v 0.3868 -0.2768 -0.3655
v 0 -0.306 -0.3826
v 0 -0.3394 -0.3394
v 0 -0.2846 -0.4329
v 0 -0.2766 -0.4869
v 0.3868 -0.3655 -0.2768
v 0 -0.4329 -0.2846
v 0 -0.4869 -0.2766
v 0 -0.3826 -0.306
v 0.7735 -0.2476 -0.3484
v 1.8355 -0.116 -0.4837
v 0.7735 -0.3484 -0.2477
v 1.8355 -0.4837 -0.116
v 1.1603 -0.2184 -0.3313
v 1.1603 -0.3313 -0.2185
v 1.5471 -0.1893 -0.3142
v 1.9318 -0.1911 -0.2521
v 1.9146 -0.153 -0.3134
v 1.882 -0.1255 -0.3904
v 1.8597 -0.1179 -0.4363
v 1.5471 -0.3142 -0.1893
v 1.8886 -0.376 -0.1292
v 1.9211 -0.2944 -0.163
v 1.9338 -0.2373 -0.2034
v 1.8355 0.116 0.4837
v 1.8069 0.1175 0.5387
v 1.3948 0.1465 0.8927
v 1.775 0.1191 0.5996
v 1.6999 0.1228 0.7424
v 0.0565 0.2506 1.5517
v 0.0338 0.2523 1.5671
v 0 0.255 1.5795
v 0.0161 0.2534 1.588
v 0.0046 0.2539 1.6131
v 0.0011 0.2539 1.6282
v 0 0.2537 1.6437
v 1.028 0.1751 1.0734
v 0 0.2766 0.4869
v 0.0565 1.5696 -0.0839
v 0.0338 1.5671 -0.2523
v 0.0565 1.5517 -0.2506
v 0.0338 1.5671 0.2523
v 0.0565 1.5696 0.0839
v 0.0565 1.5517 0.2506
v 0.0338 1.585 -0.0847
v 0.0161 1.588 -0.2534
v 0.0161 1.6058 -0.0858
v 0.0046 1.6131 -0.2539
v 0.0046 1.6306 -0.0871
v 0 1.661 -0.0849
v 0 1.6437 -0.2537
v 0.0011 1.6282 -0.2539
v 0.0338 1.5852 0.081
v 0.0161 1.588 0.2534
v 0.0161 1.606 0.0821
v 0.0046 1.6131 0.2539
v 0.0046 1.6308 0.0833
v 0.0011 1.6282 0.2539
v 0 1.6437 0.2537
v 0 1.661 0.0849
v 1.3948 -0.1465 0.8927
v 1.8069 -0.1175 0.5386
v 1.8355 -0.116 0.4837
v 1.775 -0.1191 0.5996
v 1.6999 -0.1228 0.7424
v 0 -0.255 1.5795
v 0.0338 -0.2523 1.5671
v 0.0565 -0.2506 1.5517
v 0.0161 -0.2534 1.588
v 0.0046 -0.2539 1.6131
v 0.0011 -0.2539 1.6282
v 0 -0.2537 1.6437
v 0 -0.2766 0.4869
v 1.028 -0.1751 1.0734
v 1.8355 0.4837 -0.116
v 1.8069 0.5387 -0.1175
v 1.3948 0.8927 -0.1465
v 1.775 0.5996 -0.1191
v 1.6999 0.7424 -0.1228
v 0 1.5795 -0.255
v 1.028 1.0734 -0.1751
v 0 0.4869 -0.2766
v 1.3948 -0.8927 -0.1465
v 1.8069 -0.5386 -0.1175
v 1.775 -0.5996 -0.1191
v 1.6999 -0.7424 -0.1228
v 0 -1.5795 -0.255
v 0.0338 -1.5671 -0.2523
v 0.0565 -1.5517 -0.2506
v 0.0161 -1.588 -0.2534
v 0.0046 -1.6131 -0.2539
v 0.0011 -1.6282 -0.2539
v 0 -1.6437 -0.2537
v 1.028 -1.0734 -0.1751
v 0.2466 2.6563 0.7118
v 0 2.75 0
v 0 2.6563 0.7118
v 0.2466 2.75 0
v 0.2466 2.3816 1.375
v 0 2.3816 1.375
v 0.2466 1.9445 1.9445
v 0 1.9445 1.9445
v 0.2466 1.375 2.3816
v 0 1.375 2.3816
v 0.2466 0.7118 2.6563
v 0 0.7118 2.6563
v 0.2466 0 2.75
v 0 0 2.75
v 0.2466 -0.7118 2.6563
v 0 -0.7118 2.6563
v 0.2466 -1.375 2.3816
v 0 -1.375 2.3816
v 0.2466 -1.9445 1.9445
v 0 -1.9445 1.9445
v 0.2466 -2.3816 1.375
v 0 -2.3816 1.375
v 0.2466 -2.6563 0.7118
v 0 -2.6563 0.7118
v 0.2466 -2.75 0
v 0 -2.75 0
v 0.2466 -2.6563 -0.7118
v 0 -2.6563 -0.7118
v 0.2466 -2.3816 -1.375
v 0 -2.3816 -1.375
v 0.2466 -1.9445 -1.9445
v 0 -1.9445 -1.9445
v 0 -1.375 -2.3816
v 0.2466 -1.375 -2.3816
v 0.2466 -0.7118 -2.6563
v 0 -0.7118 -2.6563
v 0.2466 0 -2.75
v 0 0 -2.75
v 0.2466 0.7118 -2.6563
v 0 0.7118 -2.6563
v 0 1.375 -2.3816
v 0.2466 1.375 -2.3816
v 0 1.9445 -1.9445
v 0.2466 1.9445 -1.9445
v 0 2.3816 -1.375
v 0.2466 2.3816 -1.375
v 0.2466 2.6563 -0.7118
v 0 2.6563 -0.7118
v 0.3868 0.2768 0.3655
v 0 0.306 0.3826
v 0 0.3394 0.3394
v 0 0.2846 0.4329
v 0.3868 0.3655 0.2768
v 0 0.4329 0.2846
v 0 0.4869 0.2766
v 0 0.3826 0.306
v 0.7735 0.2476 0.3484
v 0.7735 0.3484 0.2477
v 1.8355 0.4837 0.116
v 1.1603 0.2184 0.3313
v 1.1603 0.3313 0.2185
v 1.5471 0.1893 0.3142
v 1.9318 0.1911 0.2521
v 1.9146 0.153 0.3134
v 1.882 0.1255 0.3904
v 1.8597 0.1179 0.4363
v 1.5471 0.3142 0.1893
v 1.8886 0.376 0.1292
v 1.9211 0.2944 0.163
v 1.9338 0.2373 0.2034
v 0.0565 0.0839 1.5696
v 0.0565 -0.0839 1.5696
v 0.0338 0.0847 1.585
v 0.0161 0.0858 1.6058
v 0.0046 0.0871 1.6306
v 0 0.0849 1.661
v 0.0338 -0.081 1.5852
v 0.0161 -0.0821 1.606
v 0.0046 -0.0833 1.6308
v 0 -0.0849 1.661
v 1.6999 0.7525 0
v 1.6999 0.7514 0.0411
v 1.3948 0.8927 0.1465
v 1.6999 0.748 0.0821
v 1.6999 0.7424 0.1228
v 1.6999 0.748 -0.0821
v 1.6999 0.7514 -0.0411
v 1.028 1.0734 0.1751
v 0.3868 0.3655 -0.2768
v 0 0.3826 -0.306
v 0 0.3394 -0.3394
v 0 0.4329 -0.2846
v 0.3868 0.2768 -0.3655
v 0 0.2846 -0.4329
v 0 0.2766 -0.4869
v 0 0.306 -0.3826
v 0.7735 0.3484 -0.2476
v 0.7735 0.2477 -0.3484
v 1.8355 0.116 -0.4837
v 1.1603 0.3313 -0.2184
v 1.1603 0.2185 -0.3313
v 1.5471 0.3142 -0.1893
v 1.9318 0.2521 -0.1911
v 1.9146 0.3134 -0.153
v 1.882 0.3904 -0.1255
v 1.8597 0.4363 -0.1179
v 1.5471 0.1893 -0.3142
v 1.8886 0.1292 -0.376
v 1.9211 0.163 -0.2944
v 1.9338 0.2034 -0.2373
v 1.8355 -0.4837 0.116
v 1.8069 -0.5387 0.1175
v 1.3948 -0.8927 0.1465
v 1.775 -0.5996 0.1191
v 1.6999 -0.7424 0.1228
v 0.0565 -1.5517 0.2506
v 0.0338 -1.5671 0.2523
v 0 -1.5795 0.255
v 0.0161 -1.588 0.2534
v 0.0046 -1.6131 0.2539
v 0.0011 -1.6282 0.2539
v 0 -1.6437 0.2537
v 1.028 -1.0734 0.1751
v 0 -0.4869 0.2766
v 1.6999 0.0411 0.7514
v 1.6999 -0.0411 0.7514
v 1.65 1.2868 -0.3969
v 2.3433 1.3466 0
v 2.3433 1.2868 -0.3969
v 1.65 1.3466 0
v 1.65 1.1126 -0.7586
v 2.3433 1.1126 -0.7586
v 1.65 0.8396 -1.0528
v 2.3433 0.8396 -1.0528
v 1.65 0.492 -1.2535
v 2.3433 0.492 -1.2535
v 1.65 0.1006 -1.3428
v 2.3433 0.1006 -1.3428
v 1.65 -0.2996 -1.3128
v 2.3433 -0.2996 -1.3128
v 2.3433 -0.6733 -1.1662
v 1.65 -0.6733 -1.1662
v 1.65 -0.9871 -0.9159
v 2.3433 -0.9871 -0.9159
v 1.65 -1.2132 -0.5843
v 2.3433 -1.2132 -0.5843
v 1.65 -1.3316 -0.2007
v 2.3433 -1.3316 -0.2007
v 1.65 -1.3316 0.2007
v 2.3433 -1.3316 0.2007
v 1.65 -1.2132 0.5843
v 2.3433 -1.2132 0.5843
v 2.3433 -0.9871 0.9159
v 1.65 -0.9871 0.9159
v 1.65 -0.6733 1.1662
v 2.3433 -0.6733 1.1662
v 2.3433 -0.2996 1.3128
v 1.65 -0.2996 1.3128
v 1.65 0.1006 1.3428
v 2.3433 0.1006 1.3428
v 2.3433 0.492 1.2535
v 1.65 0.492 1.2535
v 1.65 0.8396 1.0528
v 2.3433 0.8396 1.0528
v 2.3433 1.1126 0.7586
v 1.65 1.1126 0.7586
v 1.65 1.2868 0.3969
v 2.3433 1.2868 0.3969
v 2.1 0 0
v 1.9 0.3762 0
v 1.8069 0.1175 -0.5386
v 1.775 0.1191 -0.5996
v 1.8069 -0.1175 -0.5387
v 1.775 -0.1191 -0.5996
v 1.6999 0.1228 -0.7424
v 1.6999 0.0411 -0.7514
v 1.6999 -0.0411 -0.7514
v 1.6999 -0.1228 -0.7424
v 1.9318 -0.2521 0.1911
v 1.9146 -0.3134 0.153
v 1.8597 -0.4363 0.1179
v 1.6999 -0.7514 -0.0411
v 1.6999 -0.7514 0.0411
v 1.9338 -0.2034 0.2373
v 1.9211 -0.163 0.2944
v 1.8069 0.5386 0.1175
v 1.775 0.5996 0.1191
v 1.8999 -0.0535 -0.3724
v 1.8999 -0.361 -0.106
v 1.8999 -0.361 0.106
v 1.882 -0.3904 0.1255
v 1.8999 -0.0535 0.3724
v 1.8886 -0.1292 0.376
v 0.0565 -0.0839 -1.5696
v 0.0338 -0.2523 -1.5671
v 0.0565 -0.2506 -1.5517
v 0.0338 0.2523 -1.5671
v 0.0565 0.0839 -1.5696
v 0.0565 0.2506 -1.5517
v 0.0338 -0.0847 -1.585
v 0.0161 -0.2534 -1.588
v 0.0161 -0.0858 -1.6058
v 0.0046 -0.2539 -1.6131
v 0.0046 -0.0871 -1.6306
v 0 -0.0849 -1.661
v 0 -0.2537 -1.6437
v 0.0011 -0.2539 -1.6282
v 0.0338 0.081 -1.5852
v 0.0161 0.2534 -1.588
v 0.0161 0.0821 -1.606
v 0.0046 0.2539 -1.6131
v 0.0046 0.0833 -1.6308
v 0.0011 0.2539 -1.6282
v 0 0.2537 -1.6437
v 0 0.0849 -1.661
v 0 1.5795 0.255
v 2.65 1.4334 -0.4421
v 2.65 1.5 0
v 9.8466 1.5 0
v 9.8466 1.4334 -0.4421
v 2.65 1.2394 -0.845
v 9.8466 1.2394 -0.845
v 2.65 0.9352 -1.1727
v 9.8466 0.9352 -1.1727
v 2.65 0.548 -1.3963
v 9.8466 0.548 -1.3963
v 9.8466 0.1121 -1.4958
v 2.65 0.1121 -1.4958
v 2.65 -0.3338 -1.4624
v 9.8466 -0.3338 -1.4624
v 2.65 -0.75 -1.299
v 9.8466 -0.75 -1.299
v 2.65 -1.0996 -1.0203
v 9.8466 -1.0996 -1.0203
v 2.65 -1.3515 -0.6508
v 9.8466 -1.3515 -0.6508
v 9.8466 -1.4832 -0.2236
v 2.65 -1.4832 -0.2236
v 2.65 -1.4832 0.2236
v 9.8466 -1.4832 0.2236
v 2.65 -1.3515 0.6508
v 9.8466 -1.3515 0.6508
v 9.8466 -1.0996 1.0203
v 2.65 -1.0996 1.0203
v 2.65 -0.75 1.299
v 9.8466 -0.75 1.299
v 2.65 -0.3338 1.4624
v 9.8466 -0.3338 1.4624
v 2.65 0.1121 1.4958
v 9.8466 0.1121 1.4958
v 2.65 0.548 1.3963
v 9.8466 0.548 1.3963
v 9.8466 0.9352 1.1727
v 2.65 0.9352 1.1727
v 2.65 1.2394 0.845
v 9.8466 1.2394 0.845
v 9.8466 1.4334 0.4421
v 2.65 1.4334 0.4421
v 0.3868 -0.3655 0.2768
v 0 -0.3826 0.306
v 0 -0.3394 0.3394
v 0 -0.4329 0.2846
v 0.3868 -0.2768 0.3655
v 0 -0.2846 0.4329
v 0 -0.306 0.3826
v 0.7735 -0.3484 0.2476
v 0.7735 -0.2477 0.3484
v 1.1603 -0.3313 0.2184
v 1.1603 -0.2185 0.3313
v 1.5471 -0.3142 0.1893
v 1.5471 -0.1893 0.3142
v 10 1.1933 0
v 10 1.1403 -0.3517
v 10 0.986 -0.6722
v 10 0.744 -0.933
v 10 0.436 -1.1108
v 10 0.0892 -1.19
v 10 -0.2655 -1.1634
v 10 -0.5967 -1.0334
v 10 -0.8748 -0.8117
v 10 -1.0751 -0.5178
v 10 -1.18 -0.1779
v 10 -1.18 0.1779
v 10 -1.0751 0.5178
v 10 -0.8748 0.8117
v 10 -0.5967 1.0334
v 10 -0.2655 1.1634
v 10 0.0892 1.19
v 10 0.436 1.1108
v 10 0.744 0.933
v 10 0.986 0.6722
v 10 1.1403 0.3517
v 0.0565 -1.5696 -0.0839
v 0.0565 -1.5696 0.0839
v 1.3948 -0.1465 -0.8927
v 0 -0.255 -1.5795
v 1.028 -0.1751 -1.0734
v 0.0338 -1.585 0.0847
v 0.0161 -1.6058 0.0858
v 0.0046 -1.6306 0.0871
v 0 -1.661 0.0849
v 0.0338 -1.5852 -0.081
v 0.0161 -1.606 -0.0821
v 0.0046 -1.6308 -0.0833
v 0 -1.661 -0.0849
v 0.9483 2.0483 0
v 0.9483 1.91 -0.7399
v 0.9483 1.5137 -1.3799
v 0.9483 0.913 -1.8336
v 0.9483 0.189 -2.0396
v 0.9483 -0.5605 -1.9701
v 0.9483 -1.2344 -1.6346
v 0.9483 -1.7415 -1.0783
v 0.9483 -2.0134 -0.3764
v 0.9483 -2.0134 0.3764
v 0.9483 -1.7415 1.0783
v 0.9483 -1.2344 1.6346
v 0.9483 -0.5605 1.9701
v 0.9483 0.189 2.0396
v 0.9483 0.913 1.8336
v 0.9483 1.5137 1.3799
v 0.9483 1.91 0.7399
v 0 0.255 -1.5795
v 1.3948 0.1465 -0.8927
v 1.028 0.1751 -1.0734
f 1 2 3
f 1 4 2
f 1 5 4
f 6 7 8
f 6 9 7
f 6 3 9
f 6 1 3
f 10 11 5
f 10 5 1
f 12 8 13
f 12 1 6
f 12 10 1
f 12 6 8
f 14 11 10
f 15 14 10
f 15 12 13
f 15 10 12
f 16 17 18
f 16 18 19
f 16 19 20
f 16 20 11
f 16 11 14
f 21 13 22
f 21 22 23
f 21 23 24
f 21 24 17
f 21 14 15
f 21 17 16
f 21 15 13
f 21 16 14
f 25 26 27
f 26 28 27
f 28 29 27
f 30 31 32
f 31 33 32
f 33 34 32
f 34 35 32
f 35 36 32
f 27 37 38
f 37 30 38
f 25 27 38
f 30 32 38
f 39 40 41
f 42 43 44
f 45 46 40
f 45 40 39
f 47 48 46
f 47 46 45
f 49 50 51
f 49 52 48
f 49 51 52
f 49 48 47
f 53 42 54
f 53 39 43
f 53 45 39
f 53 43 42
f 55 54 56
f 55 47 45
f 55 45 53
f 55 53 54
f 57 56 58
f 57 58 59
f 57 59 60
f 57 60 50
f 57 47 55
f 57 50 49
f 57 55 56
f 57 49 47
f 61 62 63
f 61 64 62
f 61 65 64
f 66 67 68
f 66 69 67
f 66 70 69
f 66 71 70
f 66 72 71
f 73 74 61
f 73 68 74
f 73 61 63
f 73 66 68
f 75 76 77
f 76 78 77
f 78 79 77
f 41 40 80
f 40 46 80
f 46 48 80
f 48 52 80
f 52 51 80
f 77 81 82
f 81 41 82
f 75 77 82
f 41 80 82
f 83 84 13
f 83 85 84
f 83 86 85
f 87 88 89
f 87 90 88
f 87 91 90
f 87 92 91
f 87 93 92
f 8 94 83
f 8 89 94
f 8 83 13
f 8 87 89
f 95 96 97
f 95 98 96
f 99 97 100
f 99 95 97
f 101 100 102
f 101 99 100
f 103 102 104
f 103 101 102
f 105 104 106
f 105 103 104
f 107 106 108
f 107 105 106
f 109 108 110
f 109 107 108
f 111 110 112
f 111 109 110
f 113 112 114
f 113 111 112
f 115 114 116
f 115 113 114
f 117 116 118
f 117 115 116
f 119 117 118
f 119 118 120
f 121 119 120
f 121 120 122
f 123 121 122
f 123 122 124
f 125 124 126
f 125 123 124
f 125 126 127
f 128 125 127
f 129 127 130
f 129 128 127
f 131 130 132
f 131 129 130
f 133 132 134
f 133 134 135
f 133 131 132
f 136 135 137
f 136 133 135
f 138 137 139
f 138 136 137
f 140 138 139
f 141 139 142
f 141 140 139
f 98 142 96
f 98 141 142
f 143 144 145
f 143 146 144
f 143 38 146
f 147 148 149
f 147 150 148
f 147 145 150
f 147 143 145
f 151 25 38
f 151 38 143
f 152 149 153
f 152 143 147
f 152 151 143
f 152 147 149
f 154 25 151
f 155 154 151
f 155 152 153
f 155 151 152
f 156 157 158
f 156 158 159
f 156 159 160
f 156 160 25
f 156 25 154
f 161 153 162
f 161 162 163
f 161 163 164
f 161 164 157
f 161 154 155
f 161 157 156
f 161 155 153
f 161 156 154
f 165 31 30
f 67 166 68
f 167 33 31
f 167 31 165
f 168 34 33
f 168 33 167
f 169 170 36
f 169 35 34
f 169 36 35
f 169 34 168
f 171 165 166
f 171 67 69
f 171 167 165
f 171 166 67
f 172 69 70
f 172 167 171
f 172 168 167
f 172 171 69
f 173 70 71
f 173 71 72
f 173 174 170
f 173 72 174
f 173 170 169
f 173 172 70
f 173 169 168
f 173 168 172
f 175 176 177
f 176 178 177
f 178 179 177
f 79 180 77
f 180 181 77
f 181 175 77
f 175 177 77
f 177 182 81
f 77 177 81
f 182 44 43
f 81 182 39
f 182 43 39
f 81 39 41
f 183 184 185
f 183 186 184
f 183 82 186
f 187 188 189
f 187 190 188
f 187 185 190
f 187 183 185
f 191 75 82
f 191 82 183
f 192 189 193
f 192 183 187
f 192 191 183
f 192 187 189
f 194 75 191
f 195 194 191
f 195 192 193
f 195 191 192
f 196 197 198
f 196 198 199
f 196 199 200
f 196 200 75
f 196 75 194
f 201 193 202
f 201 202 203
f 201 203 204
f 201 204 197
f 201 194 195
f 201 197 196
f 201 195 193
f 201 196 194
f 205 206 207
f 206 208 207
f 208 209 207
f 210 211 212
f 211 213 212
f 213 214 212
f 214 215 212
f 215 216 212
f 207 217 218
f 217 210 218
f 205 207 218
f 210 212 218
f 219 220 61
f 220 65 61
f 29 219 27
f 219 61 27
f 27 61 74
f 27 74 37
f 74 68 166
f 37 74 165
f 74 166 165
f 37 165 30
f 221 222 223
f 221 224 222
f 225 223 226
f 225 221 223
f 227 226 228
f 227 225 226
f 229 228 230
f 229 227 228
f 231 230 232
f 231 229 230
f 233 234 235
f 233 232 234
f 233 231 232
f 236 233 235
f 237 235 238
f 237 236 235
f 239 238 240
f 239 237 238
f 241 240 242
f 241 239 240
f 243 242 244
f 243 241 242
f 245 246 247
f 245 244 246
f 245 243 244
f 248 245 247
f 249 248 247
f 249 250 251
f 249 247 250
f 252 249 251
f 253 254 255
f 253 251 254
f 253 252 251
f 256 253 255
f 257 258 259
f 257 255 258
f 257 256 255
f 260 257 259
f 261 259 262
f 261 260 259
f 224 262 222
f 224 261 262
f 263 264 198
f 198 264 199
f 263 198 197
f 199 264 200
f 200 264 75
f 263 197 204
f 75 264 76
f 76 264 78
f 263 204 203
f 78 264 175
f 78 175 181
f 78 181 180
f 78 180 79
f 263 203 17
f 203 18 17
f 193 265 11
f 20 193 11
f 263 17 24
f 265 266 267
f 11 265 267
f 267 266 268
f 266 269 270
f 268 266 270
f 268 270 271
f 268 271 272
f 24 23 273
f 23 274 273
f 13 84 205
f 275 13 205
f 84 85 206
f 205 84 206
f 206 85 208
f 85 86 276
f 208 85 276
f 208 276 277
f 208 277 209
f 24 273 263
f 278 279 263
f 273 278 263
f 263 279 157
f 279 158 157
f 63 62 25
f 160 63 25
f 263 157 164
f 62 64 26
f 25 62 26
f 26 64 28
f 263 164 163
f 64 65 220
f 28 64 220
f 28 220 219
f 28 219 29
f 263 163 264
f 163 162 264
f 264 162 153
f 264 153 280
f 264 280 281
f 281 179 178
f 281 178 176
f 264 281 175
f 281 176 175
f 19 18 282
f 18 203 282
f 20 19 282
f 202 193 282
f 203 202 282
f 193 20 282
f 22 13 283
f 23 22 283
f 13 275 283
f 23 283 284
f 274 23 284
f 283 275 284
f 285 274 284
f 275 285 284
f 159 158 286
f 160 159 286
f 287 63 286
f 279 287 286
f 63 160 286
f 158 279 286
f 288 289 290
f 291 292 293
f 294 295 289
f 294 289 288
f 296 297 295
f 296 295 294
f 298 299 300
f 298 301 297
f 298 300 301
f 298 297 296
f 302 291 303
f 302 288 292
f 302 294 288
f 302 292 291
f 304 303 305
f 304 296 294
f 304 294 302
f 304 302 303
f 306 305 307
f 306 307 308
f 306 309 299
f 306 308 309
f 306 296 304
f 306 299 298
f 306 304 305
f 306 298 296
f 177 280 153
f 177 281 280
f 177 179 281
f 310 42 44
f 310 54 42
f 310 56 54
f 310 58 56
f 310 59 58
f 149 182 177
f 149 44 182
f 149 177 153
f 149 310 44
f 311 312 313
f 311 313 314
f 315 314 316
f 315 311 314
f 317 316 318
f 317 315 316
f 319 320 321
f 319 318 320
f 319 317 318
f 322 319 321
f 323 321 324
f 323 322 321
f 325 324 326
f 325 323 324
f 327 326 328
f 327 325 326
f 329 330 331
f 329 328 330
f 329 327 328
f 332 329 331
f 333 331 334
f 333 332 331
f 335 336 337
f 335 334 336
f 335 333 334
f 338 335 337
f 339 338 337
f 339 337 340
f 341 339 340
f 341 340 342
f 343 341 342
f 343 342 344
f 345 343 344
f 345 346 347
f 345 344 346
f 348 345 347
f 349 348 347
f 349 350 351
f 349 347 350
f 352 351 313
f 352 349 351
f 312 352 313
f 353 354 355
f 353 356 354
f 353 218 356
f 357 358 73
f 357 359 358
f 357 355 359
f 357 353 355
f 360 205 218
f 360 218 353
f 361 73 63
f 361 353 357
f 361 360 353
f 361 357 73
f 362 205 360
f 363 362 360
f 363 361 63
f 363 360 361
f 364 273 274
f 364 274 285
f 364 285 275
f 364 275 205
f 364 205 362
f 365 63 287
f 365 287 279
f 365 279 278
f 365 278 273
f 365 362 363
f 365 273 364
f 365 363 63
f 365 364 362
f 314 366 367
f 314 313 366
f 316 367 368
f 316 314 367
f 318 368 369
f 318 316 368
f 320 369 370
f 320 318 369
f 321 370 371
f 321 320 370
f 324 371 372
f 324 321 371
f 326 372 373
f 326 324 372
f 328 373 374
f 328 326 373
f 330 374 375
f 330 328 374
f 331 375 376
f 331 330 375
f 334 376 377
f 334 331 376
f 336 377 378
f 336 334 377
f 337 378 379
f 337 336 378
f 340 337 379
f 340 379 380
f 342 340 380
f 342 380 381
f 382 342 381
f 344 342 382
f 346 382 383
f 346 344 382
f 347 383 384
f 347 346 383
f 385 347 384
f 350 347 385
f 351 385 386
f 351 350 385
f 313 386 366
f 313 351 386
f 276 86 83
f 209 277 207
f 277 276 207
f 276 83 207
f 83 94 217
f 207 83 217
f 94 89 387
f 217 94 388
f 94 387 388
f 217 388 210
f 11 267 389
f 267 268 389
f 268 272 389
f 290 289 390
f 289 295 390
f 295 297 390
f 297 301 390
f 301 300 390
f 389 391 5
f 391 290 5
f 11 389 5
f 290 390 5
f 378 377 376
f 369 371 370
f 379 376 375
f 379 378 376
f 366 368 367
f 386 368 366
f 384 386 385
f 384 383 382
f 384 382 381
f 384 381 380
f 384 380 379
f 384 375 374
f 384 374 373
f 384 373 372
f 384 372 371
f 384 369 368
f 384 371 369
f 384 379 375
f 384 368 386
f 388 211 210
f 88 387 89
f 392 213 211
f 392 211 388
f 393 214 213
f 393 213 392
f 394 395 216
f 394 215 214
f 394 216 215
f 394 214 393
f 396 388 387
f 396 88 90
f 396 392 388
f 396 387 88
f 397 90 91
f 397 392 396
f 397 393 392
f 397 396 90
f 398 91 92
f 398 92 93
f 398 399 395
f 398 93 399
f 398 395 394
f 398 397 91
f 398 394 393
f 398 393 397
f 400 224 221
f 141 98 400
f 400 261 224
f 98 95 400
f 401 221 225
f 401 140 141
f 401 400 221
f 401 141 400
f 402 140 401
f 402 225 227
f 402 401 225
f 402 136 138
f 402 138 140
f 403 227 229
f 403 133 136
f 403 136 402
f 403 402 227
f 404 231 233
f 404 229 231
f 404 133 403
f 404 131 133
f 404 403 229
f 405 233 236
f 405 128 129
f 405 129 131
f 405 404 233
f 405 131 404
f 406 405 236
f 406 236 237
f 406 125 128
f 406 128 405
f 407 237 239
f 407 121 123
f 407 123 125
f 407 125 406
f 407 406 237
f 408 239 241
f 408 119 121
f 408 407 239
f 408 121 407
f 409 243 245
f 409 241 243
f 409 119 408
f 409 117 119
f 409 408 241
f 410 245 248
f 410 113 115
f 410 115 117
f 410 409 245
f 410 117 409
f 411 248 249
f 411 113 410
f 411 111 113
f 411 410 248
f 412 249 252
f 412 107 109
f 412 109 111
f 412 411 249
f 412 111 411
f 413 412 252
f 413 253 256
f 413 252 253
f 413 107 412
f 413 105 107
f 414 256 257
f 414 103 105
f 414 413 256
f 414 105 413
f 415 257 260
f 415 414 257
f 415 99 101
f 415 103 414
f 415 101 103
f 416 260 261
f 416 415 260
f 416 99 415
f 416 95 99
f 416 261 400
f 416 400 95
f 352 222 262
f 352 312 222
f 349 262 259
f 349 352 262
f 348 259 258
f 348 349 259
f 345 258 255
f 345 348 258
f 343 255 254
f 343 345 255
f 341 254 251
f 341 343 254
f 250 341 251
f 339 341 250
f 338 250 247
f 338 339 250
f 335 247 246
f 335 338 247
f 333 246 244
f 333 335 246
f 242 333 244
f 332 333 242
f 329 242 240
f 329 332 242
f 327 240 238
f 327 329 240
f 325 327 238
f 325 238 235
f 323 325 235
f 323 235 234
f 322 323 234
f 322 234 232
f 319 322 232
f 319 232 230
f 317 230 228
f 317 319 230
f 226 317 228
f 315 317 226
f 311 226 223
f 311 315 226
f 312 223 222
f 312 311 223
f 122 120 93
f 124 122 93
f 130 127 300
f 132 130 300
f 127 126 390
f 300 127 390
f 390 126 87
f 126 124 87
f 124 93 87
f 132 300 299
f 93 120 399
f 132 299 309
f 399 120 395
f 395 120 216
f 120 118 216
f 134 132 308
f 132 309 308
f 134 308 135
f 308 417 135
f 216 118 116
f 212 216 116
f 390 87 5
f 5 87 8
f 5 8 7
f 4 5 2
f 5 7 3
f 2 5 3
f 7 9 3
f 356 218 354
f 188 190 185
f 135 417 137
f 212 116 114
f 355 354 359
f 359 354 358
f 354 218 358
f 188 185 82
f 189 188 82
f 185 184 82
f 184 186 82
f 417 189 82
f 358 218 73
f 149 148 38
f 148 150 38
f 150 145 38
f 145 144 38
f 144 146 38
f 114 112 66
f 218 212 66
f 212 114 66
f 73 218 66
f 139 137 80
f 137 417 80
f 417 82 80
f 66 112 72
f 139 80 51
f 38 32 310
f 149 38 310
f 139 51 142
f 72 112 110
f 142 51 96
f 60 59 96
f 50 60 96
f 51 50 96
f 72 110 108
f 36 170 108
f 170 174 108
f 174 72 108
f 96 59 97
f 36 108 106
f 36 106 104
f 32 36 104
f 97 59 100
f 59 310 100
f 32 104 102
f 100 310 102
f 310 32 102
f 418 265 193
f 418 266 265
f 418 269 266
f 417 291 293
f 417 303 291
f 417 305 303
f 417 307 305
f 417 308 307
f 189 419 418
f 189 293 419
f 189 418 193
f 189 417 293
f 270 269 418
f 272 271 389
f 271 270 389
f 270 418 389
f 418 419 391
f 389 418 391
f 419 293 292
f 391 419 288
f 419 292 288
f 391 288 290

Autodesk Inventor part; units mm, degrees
ref_plane "YZ Plane" through (0, 0, 0) normal (1, 0, 0) x (0, 1, 0)
ref_plane "XZ Plane" through (0, 0, 0) normal (0, 1, 0) x (-1, 0, 0)
sketch "Szkic1" plane through (0, 0, 0) normal (0, 0, 1) x (1, 0, 0)
  line L0 (2.1, 0) -> (10, 0)
  line L1 (10, 0) -> (10, 1.5)
  line L2 (10, 1.5) -> (2.65, 1.5)
  line L3 (2.65, 1.5) -> (2.3433, 1.3466)
  line L4 (2.3433, 1.3466) -> (1.65, 1.3466)
  line L5 (0, 2.75) -> (0, 1.6)
  line L6 (0, 1.6) -> (1.6999, 0.7525)
  line L7 (1.6999, 0.7525) -> (2.1, 0)
  line L8 (-2, 0) -> (12, 0) projected
  line L9 (0, -0.55) -> (0, 3.3) projected
  line L10 (0, 2.75) -> (0.2466, 2.75)
  line L11 (0.2466, 2.75) -> (1.65, 1.3466)
  line L12 (2.65, 1.5) -> (1.4966, 1.5) construction
  dimension "d1" = 7.35
  dimension "d2" = 3
  dimension "d3" = 2.6933
  dimension "d4" = 3.2
  dimension "d5" = 26.5
  dimension "d6" = 62
  dimension "d7" = 2.1
  dimension "d8" = 0.3067
  dimension "d12" = 5.5
  dimension "d13" = 45
  dimension "d15" = 10
  dimension "d24" = 1.65
revolve "Bryła" add sketch "Szkic1" angle 360 about axis through (2.1, 0, 0) along (1, 0, 0) contours L7 L6 L5 L10 L11 L4 L3 L2 L1 L0
sketch "Szkic2" plane through (0, 0, 0) normal (-1, 0, 0) x (0, 0, 1)
  line L0 (0, 1.6) -> (0, 0) construction
  line L1 (0, 0) -> (1.6, 0) construction
  arc A0 (0.48, 0) -> (0, 0.48) centre (0, 0) ccw construction
  arc A1 (0.56, 0) -> (0, 0.56) centre (0, 0) ccw construction
  arc A2 (1.5795, 0.255) -> (0.255, 1.5795) centre (0, 0) ccw
  line L2 (0, 0) -> (1.1314, 1.1314) construction
  line L3 (0.255, 1.5795) -> (0.2766, 0.4869)
  line L4 (1.5795, 0.255) -> (0.4869, 0.2766)
  arc A3 (0.255, 1.5795) -> (0, 1.6) centre (0, 0) ccw
  arc A4 (1.6, 0) -> (1.5795, 0.255) centre (0, 0) ccw
  line L5 (0, -3.85) -> (0, 3.85) projected
  line L6 (-3.85, 0) -> (3.85, 0) projected
  arc A5 (0.255, -1.5795) -> (1.5795, -0.255) centre (0, 0) ccw
  line L7 (0.255, -1.5795) -> (0.2766, -0.4869)
  line L8 (1.5795, -0.255) -> (0.4869, -0.2766)
  arc A6 (0, -1.6) -> (0.255, -1.5795) centre (0, 0) ccw
  arc A7 (1.5795, -0.255) -> (1.6, 0) centre (0, 0) ccw
  arc A8 (-0.255, 1.5795) -> (-1.5795, 0.255) centre (0, 0) ccw
  line L9 (-0.255, 1.5795) -> (-0.2766, 0.4869)
  line L10 (-1.5795, 0.255) -> (-0.4869, 0.2766)
  arc A9 (0, 1.6) -> (-0.255, 1.5795) centre (0, 0) ccw
  arc A10 (-1.5795, 0.255) -> (-1.6, 0) centre (0, 0) ccw
  arc A11 (-0.255, -1.5795) -> (0, -1.6) centre (0, 0) ccw
  arc A12 (-1.5795, -0.255) -> (-0.255, -1.5795) centre (0, 0) ccw
  arc A13 (-1.6, 0) -> (-1.5795, -0.255) centre (0, 0) ccw
  line L11 (-1.5795, -0.255) -> (-0.4869, -0.2766)
  line L12 (-0.255, -1.5795) -> (-0.2766, -0.4869)
  arc A14 (0.2766, 0.4869) -> (0.4869, 0.2766) centre (0.4912, 0.4912) ccw
  arc A15 (0.4869, -0.2766) -> (0.2766, -0.4869) centre (0.4912, -0.4912) ccw
  arc A16 (-0.4869, 0.2766) -> (-0.2766, 0.4869) centre (-0.4912, 0.4912) ccw
  arc A17 (-0.2766, -0.4869) -> (-0.4869, -0.2766) centre (-0.4912, -0.4912) ccw
  point P0 (1.1314, -1.1314)
  point P1 (-1.1314, 1.1314)
  point P2 (-1.1314, -1.1314)
  dimension "d17" = 0.96
  dimension "d18" = 1.12
  dimension "d19" = 3.2
  dimension "d20" = 45
  dimension "d21" = 0.255
extrude "Szczelina" add sketch "Szkic2" against normal up to next draft 5 contours L4 A14 L3 A2 | A5 L7 A15 L8 | L9 A16 L10 A8 | A12 L11 A17 L12
fillet "Zaokrąglenie1" radius 0.102 4 edges at (0, 1.6, 0) (0, 0, -1.6) (0, -1.6, 0) (0, 0, 1.6)
thread "Gwint" size "M3x0.5" class "6g" standard "ISO Metric profile" length 7.35
chamfer "Faza1" distance 0.3067 distance2 0.1534 1 edges at (10, -1.5, 0) measured on face at (10, -0.5112, 0.3316)
ref_plane "Work Plane2" through (3.35, 0, 0) normal (0, 0, -1) x (1, 0, 0)
equation "\"d1\" = GEL"
equation "\"d2\" = GD"
equation "\"d3\" = BDM"
equation "\"d4\" = SDM"
equation "\"d7\" = INTI"
equation "\"d8\" = GAL"
equation "\"d12\" = KOD"
equation "\"d13\" = 0.5 * SEWI"
equation "\"d15\" = NLG"
equation "\"d24\" = KOH"
equation "\"d17\" = 0.3 * SDM"
equation "\"d18\" = 0.35 * SDM"
equation "\"d19\" = SDM"
equation "\"d21\" = 0.5 * SBR"
equation "\"d23\" = 0.2 * SBR"
equation "\"d10\" = GEL"
equation "\"d25\" = -0.5 * SPD + 0.5 * GD"
equation "\"d26\" = 0.5 * GAL"
equation "\"NLG\" = 10"
equation "\"GEL\" = 7.35"
equation "\"GAL\" = 0.61345 * PTC"
equation "\"SPD\" = NND - 1.2269 * PTC"
equation "\"KOD\" = 5.5"
equation "\"KOH\" = 1.65"
equation "\"SBR\" = 0.51"
equation "\"INTI\" = 2.1"
equation "\"SDM\" = 3.2"
equation "\"GD\" = NND"
equation "\"BDM\" = NND - GAL"
equation "\"SEWI\" = 90deg"
equation "\"d9\" = SDM"
equation "\"GUL\" = 0.61345 * PTC"
equation "\"TOA\" = 30deg"
equation "\"EPV\" = 3.15"
equation "\"THREADDIA\" = 3"
equation "\"PTC\" = 0.5"
equation "\"NND\" = 3"
equation "\"GD1\" = THREADDIA - 1.2269 * PTC"
properties part number "ISO 7046-1 - M3 x 10 - 4.8 - H" material "Stal"
